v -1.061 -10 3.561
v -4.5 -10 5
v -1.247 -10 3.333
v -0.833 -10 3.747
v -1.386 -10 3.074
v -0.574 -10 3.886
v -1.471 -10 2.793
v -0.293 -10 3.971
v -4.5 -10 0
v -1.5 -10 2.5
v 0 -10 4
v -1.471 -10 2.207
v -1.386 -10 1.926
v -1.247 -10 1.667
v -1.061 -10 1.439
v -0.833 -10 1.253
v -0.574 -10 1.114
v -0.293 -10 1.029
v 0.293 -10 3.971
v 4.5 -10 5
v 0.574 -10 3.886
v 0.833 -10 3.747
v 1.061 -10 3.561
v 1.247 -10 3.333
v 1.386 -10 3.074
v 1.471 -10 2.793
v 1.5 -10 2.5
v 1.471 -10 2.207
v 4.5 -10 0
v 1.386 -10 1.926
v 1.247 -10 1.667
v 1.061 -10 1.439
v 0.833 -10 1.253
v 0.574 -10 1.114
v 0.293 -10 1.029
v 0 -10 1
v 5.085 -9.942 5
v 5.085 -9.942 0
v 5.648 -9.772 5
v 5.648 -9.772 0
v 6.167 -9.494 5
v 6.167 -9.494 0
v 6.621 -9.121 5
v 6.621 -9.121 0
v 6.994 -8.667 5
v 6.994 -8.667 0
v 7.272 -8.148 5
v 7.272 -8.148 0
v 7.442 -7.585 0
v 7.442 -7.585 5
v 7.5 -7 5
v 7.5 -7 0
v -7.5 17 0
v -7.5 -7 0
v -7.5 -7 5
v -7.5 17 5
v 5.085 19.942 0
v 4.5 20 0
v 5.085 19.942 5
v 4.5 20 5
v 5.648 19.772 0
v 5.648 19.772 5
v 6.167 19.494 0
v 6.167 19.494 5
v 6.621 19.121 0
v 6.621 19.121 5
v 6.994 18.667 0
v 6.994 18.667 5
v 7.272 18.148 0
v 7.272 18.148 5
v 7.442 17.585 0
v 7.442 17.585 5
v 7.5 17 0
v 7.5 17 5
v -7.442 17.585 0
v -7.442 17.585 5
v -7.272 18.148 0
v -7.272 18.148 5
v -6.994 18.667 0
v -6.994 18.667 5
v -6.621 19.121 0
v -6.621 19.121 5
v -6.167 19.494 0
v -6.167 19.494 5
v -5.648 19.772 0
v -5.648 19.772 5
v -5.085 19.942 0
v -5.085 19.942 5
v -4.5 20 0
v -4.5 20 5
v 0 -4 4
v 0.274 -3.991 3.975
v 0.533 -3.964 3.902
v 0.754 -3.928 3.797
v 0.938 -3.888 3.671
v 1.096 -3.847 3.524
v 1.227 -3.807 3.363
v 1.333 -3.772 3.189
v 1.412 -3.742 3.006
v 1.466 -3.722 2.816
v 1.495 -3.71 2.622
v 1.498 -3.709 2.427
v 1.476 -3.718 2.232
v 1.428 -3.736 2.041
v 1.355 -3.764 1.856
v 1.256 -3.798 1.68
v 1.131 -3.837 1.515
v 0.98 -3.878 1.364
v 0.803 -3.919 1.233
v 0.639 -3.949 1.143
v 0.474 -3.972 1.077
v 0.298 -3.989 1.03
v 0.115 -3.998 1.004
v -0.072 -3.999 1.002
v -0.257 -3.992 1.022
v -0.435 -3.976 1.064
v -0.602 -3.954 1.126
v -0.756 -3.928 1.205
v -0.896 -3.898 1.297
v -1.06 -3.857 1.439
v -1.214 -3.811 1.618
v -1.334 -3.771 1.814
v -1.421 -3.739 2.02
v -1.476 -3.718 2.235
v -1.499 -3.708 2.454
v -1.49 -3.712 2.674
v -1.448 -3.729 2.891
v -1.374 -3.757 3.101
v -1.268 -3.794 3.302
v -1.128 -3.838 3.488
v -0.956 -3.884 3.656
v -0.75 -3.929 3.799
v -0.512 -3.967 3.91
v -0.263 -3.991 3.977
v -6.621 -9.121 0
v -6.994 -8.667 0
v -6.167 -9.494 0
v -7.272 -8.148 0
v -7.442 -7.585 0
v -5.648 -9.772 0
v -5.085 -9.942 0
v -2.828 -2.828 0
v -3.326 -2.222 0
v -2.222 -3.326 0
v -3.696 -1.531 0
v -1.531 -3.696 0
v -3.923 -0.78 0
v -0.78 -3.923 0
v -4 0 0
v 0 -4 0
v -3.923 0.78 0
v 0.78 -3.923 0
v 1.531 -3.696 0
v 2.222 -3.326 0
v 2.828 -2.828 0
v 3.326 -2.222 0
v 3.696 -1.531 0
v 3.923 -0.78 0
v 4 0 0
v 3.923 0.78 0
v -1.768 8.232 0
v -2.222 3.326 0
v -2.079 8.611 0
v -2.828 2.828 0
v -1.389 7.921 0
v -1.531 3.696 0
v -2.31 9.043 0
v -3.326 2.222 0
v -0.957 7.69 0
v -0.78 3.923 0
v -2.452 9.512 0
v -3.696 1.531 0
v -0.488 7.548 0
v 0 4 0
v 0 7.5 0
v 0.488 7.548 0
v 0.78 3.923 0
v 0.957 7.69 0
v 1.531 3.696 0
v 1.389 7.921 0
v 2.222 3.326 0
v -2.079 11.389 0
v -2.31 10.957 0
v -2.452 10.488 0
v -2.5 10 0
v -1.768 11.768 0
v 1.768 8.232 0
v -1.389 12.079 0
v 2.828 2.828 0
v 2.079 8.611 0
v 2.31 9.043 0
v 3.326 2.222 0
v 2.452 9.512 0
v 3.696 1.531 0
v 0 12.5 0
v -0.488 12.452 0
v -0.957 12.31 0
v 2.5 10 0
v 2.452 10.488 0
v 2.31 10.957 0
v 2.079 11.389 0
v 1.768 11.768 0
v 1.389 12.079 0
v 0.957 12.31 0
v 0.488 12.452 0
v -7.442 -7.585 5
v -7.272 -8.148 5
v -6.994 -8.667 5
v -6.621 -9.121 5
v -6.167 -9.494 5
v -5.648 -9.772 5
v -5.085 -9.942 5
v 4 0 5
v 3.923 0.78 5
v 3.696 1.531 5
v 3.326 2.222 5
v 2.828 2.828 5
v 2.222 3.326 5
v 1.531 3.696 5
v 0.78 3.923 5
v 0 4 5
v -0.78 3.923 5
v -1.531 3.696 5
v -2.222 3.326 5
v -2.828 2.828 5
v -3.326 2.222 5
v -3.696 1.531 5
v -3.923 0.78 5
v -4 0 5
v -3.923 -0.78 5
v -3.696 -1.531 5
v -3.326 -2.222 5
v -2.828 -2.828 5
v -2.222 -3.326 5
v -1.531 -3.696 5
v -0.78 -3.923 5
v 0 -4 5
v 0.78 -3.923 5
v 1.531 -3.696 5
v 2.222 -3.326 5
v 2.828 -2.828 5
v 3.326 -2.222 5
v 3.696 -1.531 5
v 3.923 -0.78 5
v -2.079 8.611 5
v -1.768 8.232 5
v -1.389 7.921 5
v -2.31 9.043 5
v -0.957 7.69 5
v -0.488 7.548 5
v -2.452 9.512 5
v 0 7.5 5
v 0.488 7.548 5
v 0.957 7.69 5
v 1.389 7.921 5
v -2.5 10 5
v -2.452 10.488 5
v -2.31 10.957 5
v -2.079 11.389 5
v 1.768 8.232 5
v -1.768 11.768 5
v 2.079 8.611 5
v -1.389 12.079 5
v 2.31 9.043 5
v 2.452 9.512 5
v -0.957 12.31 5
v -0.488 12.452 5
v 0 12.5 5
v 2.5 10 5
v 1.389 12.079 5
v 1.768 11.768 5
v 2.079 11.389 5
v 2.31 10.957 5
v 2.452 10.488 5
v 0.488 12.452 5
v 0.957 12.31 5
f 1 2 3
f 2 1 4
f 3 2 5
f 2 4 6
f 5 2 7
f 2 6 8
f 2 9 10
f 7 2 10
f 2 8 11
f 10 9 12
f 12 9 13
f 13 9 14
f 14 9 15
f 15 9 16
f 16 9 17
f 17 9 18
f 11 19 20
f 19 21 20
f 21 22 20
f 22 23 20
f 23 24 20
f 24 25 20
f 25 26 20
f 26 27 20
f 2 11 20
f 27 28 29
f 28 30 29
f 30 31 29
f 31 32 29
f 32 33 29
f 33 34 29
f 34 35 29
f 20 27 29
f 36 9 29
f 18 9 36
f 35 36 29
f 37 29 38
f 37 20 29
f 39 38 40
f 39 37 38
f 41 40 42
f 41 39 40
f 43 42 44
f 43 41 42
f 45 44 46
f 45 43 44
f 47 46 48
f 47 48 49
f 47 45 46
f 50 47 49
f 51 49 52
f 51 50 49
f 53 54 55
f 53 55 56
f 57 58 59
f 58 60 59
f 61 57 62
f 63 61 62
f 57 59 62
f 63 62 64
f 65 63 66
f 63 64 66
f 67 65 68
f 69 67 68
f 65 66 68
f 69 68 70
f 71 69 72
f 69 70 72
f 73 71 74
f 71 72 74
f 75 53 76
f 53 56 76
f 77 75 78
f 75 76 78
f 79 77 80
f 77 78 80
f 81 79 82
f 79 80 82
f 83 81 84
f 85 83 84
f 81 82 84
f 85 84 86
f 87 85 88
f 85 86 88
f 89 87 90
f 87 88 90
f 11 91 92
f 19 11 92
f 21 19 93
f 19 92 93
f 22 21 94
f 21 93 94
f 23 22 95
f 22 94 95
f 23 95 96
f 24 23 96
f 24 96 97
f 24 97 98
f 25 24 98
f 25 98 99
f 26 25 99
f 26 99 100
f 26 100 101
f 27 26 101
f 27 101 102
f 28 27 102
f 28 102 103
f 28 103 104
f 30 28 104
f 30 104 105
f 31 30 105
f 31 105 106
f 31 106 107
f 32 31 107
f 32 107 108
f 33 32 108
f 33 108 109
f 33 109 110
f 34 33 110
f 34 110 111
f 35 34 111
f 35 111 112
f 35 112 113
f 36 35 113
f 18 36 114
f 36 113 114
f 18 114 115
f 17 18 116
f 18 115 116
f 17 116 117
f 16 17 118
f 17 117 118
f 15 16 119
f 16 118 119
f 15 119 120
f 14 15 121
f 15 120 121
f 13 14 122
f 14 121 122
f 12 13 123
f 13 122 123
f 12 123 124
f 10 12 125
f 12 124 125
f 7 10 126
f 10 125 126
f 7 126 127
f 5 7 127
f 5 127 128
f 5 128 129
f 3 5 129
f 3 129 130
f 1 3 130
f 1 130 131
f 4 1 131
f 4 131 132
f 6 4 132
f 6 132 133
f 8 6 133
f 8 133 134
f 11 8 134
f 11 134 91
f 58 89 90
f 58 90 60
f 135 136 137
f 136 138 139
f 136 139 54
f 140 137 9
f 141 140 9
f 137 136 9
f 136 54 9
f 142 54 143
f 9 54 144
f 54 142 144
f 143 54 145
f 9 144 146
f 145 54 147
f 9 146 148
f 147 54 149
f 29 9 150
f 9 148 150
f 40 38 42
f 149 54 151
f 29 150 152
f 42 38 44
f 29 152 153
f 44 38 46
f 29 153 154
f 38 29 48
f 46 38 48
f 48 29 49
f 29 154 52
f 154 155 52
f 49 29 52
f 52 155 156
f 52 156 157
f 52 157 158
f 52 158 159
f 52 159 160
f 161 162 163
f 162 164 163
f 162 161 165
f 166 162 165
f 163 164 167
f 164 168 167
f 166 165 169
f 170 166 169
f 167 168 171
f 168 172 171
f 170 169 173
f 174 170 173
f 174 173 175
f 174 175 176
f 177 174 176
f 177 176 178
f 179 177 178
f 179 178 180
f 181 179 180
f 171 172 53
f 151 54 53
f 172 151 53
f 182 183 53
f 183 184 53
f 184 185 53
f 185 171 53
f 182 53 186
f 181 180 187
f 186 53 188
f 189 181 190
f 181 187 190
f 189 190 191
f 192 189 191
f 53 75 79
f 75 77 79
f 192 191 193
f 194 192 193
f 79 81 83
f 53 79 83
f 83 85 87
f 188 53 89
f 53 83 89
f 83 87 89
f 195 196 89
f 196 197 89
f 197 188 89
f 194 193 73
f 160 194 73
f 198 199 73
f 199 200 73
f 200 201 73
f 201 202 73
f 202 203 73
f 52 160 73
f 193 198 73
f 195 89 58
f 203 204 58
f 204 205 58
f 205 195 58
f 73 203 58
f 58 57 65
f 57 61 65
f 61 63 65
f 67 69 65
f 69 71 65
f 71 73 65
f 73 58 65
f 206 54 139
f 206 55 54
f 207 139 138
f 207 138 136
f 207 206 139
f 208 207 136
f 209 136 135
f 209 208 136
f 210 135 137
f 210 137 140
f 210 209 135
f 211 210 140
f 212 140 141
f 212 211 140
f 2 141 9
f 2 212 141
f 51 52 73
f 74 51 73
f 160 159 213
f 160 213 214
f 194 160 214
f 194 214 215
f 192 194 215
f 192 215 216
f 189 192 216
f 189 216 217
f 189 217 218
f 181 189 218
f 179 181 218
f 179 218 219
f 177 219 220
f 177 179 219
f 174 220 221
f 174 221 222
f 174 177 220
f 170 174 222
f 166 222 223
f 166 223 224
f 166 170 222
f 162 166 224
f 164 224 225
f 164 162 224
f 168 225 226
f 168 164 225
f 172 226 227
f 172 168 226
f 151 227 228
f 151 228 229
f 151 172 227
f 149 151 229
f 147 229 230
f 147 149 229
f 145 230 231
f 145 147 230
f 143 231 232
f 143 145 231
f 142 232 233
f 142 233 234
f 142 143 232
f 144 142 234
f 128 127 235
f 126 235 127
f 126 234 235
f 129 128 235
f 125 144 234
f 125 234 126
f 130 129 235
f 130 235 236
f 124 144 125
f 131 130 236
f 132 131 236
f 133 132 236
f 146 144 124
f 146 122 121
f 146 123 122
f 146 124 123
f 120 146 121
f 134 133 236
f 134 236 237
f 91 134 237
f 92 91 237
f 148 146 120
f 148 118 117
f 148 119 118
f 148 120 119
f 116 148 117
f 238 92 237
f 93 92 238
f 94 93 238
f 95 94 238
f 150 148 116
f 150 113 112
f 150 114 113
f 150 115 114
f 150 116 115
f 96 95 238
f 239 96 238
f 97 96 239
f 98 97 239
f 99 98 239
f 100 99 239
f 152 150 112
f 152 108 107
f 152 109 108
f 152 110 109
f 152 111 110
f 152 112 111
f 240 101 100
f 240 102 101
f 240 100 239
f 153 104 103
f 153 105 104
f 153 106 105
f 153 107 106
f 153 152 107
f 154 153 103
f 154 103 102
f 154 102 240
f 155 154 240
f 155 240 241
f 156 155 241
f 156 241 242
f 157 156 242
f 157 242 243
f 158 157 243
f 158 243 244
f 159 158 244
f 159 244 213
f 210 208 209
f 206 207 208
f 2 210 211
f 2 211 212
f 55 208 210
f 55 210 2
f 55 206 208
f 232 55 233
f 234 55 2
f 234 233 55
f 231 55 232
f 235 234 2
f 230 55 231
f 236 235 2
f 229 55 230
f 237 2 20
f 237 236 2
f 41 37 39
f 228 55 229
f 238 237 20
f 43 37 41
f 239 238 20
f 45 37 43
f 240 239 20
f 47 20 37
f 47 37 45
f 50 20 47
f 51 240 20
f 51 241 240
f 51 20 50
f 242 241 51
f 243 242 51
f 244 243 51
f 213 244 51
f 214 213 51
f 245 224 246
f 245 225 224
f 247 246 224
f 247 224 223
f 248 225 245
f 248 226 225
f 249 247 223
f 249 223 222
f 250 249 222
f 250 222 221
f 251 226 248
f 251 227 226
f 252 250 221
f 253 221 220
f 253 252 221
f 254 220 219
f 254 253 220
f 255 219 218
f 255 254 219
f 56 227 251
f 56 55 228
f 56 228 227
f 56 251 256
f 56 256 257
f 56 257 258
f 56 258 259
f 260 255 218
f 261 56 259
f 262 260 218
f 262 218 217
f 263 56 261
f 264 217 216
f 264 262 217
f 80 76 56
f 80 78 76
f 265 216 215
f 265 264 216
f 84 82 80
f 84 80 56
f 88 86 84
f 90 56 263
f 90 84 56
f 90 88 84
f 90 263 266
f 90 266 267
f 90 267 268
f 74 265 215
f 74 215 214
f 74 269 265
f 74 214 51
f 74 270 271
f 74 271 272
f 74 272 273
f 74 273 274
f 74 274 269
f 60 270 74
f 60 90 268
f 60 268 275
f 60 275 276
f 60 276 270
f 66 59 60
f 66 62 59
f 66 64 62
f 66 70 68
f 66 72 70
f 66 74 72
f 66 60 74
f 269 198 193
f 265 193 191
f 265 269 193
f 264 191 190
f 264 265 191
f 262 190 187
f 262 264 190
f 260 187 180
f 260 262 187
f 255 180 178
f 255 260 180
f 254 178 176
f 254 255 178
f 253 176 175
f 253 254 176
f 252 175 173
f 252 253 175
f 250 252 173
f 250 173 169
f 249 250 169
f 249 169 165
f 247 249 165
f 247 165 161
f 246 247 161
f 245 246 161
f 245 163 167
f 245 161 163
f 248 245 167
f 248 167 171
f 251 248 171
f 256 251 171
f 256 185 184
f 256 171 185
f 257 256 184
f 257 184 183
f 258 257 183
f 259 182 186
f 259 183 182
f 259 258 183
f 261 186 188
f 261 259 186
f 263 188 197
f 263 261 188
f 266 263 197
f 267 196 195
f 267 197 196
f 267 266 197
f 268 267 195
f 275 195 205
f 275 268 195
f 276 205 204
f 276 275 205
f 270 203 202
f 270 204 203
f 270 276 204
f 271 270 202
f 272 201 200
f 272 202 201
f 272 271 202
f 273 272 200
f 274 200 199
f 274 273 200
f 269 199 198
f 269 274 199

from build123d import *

# Parameters (mm, degrees)
SKETCH1_W           = 15
SKETCH1_H           = 30
SKETCH1_R           = 4
BOSS_EXTRUDE1_DEPTH = 5
SKETCH3_R           = 1.5
CUT_EXTRUDE1_DEPTH  = 30
SKETCH2_R           = 2.5
CUT_EXTRUDE2_DEPTH  = 10
FILLET1_R           = 3


with BuildPart() as part:
    # Sketch1 → Boss-Extrude1 (new body)
    with BuildSketch(Plane.XY):
        with Locations((0, 5)):
            Rectangle(SKETCH1_W, SKETCH1_H)
        Circle(SKETCH1_R, mode=Mode.SUBTRACT)
    extrude(amount=BOSS_EXTRUDE1_DEPTH)

    # Sketch3 → Cut-Extrude1 (cut)
    with BuildSketch(Plane(origin=(0, 0, 0), x_dir=(0, 0, -1), z_dir=(0, 1, 0))):
        with Locations(Location((-2.5, 0, 0), (0, 0, 180))):
            Circle(SKETCH3_R)
    extrude(amount=-CUT_EXTRUDE1_DEPTH, mode=Mode.SUBTRACT)

    # Sketch2 → Cut-Extrude2 (cut)
    with BuildSketch(Plane(origin=(0, -24.379216841, 5), x_dir=(1, 0, 0), z_dir=(0, 0, -1))):
        with Locations((0, -34.379216841)):
            Circle(SKETCH2_R)
    extrude(amount=CUT_EXTRUDE2_DEPTH, mode=Mode.SUBTRACT)

    # Fillet1
    fillet1_edges = [part.edges().sort_by_distance(p)[0] for p in [
        (-7.5, 20, 2.5),
        (7.5, 20, 2.5),
        (7.5, -10, 2.5),
        (-7.5, -10, 2.5),
    ]]
    fillet(fillet1_edges, radius=FILLET1_R)


solid = part.part
